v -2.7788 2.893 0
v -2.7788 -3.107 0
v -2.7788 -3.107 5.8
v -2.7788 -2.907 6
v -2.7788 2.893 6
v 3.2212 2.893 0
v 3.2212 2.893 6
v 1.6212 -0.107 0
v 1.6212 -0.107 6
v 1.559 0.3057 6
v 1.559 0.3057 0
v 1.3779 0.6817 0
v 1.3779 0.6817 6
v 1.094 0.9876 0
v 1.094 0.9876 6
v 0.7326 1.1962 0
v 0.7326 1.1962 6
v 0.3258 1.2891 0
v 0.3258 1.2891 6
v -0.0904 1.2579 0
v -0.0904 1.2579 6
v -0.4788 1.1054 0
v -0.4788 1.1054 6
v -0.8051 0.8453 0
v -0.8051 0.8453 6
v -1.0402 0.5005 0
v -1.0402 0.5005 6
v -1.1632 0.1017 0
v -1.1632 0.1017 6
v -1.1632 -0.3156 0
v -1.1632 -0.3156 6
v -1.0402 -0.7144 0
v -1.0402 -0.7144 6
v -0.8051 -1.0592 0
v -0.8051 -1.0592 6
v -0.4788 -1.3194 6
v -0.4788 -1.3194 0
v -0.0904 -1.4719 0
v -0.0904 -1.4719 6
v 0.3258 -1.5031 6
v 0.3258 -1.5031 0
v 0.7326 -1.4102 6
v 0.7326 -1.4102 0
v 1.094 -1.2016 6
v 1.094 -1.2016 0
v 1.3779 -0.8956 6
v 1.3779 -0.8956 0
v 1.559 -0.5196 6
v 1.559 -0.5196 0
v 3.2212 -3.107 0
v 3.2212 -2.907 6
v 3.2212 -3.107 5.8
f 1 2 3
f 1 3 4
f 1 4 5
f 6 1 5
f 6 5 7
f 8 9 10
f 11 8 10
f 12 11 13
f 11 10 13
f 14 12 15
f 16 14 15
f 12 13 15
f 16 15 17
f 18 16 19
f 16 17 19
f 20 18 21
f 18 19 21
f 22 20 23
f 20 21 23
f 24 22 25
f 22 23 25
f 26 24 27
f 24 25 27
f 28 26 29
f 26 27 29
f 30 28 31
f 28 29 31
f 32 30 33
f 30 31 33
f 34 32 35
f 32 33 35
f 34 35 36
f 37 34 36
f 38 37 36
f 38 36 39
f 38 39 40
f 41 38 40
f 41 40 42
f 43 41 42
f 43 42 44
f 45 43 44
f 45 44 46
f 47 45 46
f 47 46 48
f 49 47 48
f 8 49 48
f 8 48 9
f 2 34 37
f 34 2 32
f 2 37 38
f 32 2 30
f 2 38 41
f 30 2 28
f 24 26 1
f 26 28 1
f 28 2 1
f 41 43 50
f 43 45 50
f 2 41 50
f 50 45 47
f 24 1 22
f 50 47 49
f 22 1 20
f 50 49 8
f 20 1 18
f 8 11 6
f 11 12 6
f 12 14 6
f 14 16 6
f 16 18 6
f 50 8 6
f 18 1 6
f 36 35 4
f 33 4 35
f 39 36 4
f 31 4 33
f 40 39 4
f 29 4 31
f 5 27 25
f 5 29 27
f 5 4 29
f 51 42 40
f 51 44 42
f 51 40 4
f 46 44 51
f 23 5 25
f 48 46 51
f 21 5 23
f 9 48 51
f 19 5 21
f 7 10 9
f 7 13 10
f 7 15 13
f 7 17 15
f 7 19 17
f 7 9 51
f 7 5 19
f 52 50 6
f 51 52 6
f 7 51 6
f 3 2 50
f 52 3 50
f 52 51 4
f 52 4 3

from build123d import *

# Parameters (mm, degrees)
SKETCH_1_W          = 6
SKETCH_1_H          = 6
EXTRUDE_1_DEPTH     = 6
SKETCH_2_R          = 1.4
CUT_EXTRUDE_1_DEPTH = 7
CUT_EXTRUDE_2_DEPTH = 7


with BuildPart() as part:
    # ｽｹｯﾁ1 → ﾎﾞｽ - 押し出し1 (new body)
    with BuildSketch(Plane.XY):
        with Locations((0.221154353, -0.1069869)):
            Rectangle(SKETCH_1_W, SKETCH_1_H)
    extrude(amount=EXTRUDE_1_DEPTH)

    # ｽｹｯﾁ2 → ｶｯﾄ - 押し出し1 (cut, through all)
    with BuildSketch(Plane.XY.offset(6)):
        with Locations((0.221154353, -0.1069869)):
            Circle(SKETCH_2_R)
    extrude(amount=-CUT_EXTRUDE_1_DEPTH, mode=Mode.SUBTRACT)

    # ｽｹｯﾁ3 → ｶｯﾄ - 押し出し2 (cut, through all)
    with BuildSketch(Plane(origin=(3.221154353, 0, 0), x_dir=(0, 0, -1), z_dir=(1, 0, 0))):
        Polygon((-6, -3.1069869), (-6, -2.9069869), (-5.8, -3.1069869), align=None)
    extrude(amount=-CUT_EXTRUDE_2_DEPTH, mode=Mode.SUBTRACT)


solid = part.part
